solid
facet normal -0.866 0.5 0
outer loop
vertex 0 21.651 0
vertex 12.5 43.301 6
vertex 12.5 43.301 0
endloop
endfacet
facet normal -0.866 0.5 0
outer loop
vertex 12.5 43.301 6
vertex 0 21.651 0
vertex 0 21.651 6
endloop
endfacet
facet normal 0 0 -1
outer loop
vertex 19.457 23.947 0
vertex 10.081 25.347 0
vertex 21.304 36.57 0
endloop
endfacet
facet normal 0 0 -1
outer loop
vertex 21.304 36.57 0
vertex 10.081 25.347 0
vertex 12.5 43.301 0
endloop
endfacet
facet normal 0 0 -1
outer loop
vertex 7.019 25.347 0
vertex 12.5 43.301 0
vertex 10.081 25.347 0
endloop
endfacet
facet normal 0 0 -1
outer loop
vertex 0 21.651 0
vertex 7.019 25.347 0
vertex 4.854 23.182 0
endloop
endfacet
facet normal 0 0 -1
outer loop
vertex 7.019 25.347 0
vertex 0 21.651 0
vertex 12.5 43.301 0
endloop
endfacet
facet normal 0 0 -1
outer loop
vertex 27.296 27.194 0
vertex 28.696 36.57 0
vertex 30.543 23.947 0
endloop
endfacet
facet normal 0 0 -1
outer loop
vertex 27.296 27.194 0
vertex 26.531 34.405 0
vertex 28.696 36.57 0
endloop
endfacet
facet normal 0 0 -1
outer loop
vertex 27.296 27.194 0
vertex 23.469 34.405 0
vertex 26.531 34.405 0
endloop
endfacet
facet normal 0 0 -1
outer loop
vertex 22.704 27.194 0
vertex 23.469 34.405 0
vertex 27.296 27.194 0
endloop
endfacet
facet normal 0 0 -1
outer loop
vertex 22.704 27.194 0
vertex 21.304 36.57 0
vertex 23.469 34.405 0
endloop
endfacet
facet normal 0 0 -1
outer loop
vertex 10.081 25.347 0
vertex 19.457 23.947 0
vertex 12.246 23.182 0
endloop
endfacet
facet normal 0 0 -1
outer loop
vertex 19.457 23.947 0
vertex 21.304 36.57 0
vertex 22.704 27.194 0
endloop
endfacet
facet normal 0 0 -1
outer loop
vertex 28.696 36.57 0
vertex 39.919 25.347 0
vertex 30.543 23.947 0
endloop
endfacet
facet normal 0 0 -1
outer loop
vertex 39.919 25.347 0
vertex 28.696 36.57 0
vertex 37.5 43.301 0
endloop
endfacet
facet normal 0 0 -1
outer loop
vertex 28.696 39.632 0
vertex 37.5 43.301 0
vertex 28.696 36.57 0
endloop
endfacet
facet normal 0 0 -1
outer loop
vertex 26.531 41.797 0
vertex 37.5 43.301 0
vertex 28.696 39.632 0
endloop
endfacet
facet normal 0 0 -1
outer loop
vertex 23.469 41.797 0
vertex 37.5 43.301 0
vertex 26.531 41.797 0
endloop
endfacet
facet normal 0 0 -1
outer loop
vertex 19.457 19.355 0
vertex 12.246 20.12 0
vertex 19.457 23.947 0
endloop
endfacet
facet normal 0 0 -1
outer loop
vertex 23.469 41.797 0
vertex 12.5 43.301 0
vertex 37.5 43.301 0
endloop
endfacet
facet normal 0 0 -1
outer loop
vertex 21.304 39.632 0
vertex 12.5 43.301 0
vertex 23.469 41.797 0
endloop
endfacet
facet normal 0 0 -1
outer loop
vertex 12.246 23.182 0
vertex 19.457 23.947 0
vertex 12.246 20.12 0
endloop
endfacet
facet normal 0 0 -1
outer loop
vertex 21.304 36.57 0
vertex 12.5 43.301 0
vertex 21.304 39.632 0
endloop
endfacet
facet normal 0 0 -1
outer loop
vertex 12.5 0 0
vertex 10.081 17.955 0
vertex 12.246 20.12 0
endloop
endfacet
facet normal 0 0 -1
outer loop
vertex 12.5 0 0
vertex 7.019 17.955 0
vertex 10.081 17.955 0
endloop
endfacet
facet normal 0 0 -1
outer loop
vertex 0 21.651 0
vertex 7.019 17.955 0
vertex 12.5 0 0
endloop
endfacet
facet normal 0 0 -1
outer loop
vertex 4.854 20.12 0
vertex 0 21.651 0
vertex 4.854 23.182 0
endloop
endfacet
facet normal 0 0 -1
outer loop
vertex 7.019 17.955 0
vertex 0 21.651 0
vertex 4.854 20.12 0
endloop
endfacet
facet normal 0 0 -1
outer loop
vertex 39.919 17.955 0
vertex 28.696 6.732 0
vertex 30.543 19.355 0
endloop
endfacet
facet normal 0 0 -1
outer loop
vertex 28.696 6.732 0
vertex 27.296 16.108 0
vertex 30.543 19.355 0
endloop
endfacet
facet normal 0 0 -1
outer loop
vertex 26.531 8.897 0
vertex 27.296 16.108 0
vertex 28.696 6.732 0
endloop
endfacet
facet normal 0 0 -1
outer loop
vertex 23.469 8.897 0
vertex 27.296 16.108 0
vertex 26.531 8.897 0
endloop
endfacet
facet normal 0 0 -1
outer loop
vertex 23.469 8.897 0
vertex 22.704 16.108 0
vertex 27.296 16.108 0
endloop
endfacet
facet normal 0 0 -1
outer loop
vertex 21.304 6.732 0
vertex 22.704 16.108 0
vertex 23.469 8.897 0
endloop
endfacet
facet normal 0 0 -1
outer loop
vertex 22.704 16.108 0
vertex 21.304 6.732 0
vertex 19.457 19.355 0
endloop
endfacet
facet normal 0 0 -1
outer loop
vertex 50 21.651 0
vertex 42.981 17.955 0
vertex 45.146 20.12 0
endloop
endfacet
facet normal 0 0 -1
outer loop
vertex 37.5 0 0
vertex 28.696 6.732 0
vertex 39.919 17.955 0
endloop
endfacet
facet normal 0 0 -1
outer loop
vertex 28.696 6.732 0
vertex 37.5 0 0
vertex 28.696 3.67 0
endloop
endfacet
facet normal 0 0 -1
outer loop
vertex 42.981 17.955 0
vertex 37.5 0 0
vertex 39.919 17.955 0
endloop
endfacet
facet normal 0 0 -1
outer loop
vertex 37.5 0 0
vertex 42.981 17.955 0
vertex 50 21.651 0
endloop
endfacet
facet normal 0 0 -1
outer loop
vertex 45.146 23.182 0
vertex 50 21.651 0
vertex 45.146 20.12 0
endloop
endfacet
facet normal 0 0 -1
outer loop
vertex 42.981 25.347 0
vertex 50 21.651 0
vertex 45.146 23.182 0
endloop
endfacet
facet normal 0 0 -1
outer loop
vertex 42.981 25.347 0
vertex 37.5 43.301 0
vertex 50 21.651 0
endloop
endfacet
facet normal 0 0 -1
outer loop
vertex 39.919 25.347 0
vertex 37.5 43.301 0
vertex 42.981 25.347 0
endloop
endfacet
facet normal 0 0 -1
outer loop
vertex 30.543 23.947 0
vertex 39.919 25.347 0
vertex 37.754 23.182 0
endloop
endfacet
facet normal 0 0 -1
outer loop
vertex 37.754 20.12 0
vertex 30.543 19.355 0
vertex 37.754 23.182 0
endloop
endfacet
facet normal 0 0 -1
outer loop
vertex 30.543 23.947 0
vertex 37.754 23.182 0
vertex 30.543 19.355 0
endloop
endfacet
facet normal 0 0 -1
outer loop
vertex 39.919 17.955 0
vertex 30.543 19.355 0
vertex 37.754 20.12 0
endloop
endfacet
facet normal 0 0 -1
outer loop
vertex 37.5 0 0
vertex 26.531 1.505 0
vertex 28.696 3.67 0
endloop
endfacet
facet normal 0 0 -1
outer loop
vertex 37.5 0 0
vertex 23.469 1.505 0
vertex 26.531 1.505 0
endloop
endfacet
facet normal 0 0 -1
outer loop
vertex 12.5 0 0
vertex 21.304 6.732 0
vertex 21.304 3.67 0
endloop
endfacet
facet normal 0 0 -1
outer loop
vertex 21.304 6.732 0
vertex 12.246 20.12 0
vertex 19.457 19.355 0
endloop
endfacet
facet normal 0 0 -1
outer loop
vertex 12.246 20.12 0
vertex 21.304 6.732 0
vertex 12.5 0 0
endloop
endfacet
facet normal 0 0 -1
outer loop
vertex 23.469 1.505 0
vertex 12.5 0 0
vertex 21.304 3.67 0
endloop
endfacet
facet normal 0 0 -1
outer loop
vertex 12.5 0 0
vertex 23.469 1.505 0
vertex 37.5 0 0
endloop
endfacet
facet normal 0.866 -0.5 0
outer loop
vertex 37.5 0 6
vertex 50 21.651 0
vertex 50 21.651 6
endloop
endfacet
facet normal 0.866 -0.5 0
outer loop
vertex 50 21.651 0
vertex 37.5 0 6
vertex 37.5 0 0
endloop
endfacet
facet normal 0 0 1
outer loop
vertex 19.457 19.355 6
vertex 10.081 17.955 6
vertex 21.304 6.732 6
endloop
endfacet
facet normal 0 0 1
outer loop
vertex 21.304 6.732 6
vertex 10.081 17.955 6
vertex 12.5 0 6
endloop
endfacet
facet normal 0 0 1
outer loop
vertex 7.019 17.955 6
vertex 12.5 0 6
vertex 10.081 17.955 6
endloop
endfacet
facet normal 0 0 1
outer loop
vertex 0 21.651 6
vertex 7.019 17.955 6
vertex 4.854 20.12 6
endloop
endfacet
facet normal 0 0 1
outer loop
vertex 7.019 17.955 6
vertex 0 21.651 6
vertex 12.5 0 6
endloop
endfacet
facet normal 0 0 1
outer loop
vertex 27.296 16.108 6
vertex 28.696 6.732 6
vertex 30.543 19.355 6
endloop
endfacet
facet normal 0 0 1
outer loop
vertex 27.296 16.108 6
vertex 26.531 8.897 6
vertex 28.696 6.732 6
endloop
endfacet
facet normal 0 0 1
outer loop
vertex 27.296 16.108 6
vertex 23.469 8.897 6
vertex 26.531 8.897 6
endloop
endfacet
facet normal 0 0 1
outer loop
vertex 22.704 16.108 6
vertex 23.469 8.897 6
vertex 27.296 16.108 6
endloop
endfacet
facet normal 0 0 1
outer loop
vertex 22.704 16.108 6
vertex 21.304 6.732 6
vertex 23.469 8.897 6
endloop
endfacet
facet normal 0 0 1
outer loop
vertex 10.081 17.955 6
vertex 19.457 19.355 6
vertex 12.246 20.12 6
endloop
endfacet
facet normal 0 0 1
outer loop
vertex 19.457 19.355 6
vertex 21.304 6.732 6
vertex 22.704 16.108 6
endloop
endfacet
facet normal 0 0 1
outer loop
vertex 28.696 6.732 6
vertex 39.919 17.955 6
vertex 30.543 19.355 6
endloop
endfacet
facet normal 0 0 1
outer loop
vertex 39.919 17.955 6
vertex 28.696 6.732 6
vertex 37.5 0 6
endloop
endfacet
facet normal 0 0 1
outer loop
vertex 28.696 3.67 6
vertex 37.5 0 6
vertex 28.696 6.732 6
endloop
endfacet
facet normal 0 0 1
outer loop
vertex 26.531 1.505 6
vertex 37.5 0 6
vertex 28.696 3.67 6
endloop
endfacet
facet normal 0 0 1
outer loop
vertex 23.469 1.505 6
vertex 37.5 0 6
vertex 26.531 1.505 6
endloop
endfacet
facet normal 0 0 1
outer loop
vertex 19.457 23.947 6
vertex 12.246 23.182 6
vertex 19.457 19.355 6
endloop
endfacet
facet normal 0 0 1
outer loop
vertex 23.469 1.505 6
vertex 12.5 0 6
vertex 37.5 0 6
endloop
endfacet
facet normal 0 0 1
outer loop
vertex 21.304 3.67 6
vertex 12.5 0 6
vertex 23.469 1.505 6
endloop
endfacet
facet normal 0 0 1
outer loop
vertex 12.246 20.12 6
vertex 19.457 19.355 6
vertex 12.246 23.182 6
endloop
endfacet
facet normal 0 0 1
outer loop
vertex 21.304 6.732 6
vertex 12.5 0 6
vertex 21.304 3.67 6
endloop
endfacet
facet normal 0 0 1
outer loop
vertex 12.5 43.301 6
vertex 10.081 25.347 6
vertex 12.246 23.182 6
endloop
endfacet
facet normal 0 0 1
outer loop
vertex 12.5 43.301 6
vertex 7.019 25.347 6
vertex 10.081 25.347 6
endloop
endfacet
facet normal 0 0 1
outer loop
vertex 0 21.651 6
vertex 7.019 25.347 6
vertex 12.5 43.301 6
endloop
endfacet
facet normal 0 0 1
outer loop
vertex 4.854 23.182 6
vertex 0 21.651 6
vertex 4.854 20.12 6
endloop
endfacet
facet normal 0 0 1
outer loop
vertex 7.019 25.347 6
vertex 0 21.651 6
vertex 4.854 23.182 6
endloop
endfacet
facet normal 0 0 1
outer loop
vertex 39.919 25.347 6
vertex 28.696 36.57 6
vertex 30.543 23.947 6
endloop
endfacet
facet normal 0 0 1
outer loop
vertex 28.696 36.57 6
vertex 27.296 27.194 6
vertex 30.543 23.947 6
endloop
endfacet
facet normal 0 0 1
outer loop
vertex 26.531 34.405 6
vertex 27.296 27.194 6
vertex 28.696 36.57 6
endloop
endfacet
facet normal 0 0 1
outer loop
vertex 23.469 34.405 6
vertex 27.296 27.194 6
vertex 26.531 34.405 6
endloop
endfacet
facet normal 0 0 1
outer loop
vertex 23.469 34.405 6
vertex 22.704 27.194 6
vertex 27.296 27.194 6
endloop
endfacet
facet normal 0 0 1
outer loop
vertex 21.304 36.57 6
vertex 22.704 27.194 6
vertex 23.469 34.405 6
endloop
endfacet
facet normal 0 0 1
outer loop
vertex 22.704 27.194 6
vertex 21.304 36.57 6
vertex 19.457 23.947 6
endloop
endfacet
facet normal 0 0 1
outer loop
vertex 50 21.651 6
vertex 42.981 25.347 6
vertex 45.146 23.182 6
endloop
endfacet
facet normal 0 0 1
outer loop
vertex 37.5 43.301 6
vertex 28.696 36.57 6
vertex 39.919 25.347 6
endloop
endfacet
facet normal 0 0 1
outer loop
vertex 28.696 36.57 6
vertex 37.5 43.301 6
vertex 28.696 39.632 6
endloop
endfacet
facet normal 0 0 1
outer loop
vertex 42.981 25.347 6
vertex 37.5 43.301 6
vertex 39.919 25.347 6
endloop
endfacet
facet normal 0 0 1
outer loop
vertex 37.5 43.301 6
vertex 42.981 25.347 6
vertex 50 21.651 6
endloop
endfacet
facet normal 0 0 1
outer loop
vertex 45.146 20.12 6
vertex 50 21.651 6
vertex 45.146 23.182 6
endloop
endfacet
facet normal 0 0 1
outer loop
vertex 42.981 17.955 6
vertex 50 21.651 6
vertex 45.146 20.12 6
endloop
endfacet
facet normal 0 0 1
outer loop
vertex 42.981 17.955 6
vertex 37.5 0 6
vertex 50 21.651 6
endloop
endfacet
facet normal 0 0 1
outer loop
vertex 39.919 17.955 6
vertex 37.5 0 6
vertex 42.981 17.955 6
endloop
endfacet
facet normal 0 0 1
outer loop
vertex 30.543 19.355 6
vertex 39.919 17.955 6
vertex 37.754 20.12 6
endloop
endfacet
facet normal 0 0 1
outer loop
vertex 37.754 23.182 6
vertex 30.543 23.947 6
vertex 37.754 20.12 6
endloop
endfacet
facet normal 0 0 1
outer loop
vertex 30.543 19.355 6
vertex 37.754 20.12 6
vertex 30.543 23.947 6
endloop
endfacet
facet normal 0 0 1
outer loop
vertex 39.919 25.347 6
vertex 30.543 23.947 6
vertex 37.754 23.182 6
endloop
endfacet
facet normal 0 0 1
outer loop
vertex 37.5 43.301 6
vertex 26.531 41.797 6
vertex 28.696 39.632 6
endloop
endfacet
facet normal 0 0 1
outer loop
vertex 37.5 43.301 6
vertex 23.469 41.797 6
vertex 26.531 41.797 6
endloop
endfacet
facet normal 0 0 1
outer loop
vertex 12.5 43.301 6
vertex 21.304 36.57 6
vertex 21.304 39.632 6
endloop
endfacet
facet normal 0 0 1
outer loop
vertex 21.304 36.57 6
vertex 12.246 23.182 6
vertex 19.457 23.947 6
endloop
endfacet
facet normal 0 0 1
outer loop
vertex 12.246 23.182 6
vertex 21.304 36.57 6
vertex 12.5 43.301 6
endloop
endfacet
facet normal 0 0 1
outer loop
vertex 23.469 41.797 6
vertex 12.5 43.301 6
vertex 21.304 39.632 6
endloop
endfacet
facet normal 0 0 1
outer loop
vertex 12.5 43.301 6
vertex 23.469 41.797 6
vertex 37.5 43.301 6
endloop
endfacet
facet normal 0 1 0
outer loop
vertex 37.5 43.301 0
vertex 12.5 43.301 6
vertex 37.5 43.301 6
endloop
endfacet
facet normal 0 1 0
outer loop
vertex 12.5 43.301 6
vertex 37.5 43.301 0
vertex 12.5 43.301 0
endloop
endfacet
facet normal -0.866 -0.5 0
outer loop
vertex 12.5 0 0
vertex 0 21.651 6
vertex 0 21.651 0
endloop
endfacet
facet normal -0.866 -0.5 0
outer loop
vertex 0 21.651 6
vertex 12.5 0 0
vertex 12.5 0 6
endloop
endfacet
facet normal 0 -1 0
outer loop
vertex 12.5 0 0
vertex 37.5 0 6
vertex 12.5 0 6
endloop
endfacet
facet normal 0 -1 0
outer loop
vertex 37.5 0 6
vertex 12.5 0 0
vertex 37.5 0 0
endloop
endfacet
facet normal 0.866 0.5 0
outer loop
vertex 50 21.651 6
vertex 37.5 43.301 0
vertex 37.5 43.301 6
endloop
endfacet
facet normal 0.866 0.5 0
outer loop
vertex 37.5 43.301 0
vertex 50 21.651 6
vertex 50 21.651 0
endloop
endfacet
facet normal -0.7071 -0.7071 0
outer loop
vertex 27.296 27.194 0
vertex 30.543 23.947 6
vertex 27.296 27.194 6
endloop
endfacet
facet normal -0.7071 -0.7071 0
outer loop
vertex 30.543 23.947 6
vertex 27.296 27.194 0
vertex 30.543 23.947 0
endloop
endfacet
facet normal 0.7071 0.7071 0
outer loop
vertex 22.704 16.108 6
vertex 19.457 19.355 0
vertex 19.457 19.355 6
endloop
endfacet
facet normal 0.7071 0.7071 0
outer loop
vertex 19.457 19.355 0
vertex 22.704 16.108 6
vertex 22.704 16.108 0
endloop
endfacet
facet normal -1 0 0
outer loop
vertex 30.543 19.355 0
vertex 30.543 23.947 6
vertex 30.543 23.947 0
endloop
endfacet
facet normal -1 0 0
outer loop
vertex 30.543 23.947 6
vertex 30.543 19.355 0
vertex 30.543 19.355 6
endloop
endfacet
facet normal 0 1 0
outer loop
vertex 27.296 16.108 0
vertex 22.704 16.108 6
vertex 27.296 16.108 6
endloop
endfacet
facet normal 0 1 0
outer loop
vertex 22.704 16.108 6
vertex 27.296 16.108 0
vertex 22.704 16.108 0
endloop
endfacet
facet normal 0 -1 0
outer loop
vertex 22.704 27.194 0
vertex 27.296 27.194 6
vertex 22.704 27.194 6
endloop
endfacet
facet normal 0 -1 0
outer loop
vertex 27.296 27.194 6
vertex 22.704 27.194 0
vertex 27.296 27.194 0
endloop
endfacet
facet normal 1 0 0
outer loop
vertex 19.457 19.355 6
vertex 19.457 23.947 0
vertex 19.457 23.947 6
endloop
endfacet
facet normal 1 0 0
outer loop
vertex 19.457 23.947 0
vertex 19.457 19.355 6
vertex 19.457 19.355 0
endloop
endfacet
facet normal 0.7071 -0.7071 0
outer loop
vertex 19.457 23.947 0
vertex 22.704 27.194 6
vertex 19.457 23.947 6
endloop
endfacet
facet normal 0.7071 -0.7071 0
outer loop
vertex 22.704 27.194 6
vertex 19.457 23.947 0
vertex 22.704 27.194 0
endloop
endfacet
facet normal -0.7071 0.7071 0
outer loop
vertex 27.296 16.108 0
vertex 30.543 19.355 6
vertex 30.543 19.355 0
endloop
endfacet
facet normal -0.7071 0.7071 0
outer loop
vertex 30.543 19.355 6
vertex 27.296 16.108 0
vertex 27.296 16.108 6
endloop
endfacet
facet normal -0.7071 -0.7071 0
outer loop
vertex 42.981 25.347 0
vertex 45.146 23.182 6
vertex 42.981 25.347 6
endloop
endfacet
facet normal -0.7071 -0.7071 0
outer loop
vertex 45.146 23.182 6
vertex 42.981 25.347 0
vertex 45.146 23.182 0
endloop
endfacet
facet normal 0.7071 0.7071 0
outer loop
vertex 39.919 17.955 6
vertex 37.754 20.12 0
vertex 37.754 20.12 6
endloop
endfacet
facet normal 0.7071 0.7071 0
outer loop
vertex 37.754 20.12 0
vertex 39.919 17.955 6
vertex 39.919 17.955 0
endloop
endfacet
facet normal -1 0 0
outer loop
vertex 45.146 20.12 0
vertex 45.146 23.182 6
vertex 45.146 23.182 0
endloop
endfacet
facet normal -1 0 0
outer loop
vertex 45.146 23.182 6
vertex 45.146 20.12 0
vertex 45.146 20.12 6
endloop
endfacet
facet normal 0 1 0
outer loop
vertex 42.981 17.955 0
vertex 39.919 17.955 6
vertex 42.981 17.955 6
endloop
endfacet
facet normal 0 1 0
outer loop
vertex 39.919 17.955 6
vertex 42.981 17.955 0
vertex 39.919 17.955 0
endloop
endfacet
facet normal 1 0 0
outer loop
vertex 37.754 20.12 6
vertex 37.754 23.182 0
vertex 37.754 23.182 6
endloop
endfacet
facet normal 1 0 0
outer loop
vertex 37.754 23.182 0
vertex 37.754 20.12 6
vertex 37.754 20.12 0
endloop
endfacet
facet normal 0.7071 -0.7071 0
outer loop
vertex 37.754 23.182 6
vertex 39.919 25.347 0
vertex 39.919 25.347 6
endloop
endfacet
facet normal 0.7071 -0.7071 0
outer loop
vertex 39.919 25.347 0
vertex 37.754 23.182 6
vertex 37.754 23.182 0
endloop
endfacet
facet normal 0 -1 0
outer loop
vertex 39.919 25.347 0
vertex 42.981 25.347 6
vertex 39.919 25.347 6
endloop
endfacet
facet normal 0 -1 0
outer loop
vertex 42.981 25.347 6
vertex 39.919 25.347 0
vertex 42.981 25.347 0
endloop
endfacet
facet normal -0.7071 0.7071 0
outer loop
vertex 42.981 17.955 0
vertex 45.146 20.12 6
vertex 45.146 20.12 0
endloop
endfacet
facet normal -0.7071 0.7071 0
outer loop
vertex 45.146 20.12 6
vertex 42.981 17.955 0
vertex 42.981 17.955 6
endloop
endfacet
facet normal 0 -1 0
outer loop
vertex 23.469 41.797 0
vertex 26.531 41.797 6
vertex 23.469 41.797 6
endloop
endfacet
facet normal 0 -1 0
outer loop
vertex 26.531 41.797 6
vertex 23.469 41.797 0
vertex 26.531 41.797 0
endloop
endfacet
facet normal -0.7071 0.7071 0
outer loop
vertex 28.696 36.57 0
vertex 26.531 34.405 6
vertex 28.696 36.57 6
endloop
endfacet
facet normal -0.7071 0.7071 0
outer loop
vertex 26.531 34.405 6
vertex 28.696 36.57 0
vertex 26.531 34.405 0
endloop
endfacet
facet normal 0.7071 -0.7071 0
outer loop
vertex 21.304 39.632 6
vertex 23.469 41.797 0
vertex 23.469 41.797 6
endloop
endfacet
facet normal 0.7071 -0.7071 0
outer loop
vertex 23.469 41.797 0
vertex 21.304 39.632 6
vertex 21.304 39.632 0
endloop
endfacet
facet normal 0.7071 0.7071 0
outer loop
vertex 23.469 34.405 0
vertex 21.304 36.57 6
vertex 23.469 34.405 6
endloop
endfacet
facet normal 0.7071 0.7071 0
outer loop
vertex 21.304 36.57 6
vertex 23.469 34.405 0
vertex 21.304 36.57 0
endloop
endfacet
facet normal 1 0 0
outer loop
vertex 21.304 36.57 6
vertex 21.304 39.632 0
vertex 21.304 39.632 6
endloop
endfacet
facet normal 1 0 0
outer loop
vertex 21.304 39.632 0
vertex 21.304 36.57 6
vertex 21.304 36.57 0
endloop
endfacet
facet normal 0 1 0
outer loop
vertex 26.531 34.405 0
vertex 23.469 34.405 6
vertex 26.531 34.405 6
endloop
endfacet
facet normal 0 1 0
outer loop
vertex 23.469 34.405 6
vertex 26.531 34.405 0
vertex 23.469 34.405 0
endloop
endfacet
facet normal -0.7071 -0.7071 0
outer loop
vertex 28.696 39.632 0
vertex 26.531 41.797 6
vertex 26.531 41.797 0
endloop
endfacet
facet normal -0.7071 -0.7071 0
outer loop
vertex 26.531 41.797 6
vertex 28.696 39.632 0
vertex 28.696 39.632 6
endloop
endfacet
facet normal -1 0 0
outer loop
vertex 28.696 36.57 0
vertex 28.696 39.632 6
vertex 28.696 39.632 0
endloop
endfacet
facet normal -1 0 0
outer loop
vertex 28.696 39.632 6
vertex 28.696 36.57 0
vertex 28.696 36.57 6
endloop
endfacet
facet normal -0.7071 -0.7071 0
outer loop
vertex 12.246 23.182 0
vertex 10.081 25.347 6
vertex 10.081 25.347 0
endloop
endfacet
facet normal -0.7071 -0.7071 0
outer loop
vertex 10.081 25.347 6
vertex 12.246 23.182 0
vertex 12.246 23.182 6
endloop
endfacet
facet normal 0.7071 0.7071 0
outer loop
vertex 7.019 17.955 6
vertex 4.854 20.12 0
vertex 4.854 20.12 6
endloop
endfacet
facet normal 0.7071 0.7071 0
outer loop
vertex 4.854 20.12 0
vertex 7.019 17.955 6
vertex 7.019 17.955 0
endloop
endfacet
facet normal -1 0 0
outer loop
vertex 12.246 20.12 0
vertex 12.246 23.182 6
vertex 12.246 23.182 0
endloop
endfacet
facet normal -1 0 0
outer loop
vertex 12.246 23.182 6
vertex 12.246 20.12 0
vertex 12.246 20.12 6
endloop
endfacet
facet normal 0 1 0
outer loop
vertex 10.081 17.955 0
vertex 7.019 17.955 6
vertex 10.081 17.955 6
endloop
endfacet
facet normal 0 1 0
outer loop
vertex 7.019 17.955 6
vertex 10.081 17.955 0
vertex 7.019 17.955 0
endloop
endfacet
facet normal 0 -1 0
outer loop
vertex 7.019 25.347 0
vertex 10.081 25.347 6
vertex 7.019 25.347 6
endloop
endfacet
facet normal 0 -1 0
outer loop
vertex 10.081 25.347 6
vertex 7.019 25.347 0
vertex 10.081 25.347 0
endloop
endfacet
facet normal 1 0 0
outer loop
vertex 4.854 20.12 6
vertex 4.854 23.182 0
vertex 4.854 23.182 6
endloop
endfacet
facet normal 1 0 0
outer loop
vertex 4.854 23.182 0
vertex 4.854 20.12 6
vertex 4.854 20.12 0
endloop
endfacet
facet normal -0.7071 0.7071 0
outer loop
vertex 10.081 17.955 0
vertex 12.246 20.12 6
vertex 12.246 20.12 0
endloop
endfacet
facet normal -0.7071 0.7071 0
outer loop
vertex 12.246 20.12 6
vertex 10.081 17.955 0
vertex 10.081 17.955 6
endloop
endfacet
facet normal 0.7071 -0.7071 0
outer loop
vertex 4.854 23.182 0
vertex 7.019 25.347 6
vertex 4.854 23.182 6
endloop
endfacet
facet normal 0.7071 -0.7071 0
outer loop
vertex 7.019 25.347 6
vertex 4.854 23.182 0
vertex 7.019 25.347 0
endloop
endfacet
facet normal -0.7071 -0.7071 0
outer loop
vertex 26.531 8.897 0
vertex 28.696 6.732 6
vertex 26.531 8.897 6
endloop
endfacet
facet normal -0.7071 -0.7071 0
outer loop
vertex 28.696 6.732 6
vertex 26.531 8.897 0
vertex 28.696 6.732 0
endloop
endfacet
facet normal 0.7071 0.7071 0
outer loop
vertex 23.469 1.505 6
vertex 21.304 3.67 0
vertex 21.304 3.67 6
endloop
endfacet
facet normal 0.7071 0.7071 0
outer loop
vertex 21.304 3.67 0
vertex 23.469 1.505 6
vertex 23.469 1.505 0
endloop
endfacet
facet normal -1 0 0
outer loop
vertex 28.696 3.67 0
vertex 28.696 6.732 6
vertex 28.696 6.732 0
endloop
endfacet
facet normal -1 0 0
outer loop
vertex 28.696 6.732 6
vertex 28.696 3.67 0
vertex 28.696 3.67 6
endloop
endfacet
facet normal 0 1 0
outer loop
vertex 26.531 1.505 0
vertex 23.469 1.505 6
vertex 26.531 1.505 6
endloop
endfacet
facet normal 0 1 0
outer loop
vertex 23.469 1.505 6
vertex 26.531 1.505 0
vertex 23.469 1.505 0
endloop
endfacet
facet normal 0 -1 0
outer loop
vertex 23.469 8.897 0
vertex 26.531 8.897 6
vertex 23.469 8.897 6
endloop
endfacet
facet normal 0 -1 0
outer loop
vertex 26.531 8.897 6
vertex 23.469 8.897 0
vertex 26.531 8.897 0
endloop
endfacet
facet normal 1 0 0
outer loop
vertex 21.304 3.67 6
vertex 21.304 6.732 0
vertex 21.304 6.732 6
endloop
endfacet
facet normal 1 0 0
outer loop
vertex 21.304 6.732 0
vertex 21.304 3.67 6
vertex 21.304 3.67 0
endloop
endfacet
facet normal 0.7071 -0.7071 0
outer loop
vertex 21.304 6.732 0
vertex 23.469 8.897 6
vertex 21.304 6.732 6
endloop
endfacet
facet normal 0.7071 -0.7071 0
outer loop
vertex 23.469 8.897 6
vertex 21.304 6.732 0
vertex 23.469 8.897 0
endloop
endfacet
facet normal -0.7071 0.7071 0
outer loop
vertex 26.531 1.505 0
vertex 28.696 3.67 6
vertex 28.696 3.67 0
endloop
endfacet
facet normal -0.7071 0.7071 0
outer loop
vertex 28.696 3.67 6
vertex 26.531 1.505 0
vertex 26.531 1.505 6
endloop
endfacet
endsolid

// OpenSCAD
$fn = 32;

// ----------------------------------------------------------------------
// Polygon plate: 6-gon R25, 4 bolt windows
// ----------------------------------------------------------------------

// --- parameters (mm) ---
sides = 6;                // number of polygon sides
plate_r = 25;             // circumscribed radius of the polygon
bore_r = 6;               // centre bore radius
bolts = 4;                // number of bolt windows
ring_r = 16.45;           // bolt-circle radius
bolt_r = 4;               // bolt window radius
plate_t = 6;              // plate thickness, Z (extrusion height)

plate_d = 2 * plate_r;  // circumscribed diameter
bore_d = 2 * bore_r;  // centre bore diameter
bolt_d = 2 * bolt_r;  // bolt window diameter
ring_d = 2 * ring_r;  // bolt-circle diameter

profile = [[50, 21.651], [37.5, 43.301], [12.5, 43.301], [0, 21.651], [12.5, 0], [37.5, 0]];  // primary outline, 6 points, counter clockwise
void_1 = [[30.543, 23.947], [27.296, 27.194], [22.704, 27.194], [19.457, 23.947], [19.457, 19.355], [22.704, 16.108], [27.296, 16.108], [30.543, 19.355]];  // centre bore, 8 points
void_2 = [[45.146, 23.182], [42.981, 25.347], [39.919, 25.347], [37.754, 23.182], [37.754, 20.12], [39.919, 17.955], [42.981, 17.955], [45.146, 20.12]];  // bolt window 1, 8 points
void_3 = [[28.696, 39.632], [26.531, 41.797], [23.469, 41.797], [21.304, 39.632], [21.304, 36.57], [23.469, 34.405], [26.531, 34.405], [28.696, 36.57]];  // bolt window 2, 8 points
void_4 = [[12.246, 23.182], [10.081, 25.347], [7.019, 25.347], [4.854, 23.182], [4.854, 20.12], [7.019, 17.955], [10.081, 17.955], [12.246, 20.12]];  // bolt window 3, 8 points
void_5 = [[28.696, 6.732], [26.531, 8.897], [23.469, 8.897], [21.304, 6.732], [21.304, 3.67], [23.469, 1.505], [26.531, 1.505], [28.696, 3.67]];  // bolt window 4, 8 points

// --- the one profile operation ---
difference() {
  linear_extrude(height = plate_t) polygon(points = profile);
  translate([0, 0, -1])
    linear_extrude(height = plate_t + 2) polygon(points = void_1);
  translate([0, 0, -1])
    linear_extrude(height = plate_t + 2) polygon(points = void_2);
  translate([0, 0, -1])
    linear_extrude(height = plate_t + 2) polygon(points = void_3);
  translate([0, 0, -1])
    linear_extrude(height = plate_t + 2) polygon(points = void_4);
  translate([0, 0, -1])
    linear_extrude(height = plate_t + 2) polygon(points = void_5);
}
